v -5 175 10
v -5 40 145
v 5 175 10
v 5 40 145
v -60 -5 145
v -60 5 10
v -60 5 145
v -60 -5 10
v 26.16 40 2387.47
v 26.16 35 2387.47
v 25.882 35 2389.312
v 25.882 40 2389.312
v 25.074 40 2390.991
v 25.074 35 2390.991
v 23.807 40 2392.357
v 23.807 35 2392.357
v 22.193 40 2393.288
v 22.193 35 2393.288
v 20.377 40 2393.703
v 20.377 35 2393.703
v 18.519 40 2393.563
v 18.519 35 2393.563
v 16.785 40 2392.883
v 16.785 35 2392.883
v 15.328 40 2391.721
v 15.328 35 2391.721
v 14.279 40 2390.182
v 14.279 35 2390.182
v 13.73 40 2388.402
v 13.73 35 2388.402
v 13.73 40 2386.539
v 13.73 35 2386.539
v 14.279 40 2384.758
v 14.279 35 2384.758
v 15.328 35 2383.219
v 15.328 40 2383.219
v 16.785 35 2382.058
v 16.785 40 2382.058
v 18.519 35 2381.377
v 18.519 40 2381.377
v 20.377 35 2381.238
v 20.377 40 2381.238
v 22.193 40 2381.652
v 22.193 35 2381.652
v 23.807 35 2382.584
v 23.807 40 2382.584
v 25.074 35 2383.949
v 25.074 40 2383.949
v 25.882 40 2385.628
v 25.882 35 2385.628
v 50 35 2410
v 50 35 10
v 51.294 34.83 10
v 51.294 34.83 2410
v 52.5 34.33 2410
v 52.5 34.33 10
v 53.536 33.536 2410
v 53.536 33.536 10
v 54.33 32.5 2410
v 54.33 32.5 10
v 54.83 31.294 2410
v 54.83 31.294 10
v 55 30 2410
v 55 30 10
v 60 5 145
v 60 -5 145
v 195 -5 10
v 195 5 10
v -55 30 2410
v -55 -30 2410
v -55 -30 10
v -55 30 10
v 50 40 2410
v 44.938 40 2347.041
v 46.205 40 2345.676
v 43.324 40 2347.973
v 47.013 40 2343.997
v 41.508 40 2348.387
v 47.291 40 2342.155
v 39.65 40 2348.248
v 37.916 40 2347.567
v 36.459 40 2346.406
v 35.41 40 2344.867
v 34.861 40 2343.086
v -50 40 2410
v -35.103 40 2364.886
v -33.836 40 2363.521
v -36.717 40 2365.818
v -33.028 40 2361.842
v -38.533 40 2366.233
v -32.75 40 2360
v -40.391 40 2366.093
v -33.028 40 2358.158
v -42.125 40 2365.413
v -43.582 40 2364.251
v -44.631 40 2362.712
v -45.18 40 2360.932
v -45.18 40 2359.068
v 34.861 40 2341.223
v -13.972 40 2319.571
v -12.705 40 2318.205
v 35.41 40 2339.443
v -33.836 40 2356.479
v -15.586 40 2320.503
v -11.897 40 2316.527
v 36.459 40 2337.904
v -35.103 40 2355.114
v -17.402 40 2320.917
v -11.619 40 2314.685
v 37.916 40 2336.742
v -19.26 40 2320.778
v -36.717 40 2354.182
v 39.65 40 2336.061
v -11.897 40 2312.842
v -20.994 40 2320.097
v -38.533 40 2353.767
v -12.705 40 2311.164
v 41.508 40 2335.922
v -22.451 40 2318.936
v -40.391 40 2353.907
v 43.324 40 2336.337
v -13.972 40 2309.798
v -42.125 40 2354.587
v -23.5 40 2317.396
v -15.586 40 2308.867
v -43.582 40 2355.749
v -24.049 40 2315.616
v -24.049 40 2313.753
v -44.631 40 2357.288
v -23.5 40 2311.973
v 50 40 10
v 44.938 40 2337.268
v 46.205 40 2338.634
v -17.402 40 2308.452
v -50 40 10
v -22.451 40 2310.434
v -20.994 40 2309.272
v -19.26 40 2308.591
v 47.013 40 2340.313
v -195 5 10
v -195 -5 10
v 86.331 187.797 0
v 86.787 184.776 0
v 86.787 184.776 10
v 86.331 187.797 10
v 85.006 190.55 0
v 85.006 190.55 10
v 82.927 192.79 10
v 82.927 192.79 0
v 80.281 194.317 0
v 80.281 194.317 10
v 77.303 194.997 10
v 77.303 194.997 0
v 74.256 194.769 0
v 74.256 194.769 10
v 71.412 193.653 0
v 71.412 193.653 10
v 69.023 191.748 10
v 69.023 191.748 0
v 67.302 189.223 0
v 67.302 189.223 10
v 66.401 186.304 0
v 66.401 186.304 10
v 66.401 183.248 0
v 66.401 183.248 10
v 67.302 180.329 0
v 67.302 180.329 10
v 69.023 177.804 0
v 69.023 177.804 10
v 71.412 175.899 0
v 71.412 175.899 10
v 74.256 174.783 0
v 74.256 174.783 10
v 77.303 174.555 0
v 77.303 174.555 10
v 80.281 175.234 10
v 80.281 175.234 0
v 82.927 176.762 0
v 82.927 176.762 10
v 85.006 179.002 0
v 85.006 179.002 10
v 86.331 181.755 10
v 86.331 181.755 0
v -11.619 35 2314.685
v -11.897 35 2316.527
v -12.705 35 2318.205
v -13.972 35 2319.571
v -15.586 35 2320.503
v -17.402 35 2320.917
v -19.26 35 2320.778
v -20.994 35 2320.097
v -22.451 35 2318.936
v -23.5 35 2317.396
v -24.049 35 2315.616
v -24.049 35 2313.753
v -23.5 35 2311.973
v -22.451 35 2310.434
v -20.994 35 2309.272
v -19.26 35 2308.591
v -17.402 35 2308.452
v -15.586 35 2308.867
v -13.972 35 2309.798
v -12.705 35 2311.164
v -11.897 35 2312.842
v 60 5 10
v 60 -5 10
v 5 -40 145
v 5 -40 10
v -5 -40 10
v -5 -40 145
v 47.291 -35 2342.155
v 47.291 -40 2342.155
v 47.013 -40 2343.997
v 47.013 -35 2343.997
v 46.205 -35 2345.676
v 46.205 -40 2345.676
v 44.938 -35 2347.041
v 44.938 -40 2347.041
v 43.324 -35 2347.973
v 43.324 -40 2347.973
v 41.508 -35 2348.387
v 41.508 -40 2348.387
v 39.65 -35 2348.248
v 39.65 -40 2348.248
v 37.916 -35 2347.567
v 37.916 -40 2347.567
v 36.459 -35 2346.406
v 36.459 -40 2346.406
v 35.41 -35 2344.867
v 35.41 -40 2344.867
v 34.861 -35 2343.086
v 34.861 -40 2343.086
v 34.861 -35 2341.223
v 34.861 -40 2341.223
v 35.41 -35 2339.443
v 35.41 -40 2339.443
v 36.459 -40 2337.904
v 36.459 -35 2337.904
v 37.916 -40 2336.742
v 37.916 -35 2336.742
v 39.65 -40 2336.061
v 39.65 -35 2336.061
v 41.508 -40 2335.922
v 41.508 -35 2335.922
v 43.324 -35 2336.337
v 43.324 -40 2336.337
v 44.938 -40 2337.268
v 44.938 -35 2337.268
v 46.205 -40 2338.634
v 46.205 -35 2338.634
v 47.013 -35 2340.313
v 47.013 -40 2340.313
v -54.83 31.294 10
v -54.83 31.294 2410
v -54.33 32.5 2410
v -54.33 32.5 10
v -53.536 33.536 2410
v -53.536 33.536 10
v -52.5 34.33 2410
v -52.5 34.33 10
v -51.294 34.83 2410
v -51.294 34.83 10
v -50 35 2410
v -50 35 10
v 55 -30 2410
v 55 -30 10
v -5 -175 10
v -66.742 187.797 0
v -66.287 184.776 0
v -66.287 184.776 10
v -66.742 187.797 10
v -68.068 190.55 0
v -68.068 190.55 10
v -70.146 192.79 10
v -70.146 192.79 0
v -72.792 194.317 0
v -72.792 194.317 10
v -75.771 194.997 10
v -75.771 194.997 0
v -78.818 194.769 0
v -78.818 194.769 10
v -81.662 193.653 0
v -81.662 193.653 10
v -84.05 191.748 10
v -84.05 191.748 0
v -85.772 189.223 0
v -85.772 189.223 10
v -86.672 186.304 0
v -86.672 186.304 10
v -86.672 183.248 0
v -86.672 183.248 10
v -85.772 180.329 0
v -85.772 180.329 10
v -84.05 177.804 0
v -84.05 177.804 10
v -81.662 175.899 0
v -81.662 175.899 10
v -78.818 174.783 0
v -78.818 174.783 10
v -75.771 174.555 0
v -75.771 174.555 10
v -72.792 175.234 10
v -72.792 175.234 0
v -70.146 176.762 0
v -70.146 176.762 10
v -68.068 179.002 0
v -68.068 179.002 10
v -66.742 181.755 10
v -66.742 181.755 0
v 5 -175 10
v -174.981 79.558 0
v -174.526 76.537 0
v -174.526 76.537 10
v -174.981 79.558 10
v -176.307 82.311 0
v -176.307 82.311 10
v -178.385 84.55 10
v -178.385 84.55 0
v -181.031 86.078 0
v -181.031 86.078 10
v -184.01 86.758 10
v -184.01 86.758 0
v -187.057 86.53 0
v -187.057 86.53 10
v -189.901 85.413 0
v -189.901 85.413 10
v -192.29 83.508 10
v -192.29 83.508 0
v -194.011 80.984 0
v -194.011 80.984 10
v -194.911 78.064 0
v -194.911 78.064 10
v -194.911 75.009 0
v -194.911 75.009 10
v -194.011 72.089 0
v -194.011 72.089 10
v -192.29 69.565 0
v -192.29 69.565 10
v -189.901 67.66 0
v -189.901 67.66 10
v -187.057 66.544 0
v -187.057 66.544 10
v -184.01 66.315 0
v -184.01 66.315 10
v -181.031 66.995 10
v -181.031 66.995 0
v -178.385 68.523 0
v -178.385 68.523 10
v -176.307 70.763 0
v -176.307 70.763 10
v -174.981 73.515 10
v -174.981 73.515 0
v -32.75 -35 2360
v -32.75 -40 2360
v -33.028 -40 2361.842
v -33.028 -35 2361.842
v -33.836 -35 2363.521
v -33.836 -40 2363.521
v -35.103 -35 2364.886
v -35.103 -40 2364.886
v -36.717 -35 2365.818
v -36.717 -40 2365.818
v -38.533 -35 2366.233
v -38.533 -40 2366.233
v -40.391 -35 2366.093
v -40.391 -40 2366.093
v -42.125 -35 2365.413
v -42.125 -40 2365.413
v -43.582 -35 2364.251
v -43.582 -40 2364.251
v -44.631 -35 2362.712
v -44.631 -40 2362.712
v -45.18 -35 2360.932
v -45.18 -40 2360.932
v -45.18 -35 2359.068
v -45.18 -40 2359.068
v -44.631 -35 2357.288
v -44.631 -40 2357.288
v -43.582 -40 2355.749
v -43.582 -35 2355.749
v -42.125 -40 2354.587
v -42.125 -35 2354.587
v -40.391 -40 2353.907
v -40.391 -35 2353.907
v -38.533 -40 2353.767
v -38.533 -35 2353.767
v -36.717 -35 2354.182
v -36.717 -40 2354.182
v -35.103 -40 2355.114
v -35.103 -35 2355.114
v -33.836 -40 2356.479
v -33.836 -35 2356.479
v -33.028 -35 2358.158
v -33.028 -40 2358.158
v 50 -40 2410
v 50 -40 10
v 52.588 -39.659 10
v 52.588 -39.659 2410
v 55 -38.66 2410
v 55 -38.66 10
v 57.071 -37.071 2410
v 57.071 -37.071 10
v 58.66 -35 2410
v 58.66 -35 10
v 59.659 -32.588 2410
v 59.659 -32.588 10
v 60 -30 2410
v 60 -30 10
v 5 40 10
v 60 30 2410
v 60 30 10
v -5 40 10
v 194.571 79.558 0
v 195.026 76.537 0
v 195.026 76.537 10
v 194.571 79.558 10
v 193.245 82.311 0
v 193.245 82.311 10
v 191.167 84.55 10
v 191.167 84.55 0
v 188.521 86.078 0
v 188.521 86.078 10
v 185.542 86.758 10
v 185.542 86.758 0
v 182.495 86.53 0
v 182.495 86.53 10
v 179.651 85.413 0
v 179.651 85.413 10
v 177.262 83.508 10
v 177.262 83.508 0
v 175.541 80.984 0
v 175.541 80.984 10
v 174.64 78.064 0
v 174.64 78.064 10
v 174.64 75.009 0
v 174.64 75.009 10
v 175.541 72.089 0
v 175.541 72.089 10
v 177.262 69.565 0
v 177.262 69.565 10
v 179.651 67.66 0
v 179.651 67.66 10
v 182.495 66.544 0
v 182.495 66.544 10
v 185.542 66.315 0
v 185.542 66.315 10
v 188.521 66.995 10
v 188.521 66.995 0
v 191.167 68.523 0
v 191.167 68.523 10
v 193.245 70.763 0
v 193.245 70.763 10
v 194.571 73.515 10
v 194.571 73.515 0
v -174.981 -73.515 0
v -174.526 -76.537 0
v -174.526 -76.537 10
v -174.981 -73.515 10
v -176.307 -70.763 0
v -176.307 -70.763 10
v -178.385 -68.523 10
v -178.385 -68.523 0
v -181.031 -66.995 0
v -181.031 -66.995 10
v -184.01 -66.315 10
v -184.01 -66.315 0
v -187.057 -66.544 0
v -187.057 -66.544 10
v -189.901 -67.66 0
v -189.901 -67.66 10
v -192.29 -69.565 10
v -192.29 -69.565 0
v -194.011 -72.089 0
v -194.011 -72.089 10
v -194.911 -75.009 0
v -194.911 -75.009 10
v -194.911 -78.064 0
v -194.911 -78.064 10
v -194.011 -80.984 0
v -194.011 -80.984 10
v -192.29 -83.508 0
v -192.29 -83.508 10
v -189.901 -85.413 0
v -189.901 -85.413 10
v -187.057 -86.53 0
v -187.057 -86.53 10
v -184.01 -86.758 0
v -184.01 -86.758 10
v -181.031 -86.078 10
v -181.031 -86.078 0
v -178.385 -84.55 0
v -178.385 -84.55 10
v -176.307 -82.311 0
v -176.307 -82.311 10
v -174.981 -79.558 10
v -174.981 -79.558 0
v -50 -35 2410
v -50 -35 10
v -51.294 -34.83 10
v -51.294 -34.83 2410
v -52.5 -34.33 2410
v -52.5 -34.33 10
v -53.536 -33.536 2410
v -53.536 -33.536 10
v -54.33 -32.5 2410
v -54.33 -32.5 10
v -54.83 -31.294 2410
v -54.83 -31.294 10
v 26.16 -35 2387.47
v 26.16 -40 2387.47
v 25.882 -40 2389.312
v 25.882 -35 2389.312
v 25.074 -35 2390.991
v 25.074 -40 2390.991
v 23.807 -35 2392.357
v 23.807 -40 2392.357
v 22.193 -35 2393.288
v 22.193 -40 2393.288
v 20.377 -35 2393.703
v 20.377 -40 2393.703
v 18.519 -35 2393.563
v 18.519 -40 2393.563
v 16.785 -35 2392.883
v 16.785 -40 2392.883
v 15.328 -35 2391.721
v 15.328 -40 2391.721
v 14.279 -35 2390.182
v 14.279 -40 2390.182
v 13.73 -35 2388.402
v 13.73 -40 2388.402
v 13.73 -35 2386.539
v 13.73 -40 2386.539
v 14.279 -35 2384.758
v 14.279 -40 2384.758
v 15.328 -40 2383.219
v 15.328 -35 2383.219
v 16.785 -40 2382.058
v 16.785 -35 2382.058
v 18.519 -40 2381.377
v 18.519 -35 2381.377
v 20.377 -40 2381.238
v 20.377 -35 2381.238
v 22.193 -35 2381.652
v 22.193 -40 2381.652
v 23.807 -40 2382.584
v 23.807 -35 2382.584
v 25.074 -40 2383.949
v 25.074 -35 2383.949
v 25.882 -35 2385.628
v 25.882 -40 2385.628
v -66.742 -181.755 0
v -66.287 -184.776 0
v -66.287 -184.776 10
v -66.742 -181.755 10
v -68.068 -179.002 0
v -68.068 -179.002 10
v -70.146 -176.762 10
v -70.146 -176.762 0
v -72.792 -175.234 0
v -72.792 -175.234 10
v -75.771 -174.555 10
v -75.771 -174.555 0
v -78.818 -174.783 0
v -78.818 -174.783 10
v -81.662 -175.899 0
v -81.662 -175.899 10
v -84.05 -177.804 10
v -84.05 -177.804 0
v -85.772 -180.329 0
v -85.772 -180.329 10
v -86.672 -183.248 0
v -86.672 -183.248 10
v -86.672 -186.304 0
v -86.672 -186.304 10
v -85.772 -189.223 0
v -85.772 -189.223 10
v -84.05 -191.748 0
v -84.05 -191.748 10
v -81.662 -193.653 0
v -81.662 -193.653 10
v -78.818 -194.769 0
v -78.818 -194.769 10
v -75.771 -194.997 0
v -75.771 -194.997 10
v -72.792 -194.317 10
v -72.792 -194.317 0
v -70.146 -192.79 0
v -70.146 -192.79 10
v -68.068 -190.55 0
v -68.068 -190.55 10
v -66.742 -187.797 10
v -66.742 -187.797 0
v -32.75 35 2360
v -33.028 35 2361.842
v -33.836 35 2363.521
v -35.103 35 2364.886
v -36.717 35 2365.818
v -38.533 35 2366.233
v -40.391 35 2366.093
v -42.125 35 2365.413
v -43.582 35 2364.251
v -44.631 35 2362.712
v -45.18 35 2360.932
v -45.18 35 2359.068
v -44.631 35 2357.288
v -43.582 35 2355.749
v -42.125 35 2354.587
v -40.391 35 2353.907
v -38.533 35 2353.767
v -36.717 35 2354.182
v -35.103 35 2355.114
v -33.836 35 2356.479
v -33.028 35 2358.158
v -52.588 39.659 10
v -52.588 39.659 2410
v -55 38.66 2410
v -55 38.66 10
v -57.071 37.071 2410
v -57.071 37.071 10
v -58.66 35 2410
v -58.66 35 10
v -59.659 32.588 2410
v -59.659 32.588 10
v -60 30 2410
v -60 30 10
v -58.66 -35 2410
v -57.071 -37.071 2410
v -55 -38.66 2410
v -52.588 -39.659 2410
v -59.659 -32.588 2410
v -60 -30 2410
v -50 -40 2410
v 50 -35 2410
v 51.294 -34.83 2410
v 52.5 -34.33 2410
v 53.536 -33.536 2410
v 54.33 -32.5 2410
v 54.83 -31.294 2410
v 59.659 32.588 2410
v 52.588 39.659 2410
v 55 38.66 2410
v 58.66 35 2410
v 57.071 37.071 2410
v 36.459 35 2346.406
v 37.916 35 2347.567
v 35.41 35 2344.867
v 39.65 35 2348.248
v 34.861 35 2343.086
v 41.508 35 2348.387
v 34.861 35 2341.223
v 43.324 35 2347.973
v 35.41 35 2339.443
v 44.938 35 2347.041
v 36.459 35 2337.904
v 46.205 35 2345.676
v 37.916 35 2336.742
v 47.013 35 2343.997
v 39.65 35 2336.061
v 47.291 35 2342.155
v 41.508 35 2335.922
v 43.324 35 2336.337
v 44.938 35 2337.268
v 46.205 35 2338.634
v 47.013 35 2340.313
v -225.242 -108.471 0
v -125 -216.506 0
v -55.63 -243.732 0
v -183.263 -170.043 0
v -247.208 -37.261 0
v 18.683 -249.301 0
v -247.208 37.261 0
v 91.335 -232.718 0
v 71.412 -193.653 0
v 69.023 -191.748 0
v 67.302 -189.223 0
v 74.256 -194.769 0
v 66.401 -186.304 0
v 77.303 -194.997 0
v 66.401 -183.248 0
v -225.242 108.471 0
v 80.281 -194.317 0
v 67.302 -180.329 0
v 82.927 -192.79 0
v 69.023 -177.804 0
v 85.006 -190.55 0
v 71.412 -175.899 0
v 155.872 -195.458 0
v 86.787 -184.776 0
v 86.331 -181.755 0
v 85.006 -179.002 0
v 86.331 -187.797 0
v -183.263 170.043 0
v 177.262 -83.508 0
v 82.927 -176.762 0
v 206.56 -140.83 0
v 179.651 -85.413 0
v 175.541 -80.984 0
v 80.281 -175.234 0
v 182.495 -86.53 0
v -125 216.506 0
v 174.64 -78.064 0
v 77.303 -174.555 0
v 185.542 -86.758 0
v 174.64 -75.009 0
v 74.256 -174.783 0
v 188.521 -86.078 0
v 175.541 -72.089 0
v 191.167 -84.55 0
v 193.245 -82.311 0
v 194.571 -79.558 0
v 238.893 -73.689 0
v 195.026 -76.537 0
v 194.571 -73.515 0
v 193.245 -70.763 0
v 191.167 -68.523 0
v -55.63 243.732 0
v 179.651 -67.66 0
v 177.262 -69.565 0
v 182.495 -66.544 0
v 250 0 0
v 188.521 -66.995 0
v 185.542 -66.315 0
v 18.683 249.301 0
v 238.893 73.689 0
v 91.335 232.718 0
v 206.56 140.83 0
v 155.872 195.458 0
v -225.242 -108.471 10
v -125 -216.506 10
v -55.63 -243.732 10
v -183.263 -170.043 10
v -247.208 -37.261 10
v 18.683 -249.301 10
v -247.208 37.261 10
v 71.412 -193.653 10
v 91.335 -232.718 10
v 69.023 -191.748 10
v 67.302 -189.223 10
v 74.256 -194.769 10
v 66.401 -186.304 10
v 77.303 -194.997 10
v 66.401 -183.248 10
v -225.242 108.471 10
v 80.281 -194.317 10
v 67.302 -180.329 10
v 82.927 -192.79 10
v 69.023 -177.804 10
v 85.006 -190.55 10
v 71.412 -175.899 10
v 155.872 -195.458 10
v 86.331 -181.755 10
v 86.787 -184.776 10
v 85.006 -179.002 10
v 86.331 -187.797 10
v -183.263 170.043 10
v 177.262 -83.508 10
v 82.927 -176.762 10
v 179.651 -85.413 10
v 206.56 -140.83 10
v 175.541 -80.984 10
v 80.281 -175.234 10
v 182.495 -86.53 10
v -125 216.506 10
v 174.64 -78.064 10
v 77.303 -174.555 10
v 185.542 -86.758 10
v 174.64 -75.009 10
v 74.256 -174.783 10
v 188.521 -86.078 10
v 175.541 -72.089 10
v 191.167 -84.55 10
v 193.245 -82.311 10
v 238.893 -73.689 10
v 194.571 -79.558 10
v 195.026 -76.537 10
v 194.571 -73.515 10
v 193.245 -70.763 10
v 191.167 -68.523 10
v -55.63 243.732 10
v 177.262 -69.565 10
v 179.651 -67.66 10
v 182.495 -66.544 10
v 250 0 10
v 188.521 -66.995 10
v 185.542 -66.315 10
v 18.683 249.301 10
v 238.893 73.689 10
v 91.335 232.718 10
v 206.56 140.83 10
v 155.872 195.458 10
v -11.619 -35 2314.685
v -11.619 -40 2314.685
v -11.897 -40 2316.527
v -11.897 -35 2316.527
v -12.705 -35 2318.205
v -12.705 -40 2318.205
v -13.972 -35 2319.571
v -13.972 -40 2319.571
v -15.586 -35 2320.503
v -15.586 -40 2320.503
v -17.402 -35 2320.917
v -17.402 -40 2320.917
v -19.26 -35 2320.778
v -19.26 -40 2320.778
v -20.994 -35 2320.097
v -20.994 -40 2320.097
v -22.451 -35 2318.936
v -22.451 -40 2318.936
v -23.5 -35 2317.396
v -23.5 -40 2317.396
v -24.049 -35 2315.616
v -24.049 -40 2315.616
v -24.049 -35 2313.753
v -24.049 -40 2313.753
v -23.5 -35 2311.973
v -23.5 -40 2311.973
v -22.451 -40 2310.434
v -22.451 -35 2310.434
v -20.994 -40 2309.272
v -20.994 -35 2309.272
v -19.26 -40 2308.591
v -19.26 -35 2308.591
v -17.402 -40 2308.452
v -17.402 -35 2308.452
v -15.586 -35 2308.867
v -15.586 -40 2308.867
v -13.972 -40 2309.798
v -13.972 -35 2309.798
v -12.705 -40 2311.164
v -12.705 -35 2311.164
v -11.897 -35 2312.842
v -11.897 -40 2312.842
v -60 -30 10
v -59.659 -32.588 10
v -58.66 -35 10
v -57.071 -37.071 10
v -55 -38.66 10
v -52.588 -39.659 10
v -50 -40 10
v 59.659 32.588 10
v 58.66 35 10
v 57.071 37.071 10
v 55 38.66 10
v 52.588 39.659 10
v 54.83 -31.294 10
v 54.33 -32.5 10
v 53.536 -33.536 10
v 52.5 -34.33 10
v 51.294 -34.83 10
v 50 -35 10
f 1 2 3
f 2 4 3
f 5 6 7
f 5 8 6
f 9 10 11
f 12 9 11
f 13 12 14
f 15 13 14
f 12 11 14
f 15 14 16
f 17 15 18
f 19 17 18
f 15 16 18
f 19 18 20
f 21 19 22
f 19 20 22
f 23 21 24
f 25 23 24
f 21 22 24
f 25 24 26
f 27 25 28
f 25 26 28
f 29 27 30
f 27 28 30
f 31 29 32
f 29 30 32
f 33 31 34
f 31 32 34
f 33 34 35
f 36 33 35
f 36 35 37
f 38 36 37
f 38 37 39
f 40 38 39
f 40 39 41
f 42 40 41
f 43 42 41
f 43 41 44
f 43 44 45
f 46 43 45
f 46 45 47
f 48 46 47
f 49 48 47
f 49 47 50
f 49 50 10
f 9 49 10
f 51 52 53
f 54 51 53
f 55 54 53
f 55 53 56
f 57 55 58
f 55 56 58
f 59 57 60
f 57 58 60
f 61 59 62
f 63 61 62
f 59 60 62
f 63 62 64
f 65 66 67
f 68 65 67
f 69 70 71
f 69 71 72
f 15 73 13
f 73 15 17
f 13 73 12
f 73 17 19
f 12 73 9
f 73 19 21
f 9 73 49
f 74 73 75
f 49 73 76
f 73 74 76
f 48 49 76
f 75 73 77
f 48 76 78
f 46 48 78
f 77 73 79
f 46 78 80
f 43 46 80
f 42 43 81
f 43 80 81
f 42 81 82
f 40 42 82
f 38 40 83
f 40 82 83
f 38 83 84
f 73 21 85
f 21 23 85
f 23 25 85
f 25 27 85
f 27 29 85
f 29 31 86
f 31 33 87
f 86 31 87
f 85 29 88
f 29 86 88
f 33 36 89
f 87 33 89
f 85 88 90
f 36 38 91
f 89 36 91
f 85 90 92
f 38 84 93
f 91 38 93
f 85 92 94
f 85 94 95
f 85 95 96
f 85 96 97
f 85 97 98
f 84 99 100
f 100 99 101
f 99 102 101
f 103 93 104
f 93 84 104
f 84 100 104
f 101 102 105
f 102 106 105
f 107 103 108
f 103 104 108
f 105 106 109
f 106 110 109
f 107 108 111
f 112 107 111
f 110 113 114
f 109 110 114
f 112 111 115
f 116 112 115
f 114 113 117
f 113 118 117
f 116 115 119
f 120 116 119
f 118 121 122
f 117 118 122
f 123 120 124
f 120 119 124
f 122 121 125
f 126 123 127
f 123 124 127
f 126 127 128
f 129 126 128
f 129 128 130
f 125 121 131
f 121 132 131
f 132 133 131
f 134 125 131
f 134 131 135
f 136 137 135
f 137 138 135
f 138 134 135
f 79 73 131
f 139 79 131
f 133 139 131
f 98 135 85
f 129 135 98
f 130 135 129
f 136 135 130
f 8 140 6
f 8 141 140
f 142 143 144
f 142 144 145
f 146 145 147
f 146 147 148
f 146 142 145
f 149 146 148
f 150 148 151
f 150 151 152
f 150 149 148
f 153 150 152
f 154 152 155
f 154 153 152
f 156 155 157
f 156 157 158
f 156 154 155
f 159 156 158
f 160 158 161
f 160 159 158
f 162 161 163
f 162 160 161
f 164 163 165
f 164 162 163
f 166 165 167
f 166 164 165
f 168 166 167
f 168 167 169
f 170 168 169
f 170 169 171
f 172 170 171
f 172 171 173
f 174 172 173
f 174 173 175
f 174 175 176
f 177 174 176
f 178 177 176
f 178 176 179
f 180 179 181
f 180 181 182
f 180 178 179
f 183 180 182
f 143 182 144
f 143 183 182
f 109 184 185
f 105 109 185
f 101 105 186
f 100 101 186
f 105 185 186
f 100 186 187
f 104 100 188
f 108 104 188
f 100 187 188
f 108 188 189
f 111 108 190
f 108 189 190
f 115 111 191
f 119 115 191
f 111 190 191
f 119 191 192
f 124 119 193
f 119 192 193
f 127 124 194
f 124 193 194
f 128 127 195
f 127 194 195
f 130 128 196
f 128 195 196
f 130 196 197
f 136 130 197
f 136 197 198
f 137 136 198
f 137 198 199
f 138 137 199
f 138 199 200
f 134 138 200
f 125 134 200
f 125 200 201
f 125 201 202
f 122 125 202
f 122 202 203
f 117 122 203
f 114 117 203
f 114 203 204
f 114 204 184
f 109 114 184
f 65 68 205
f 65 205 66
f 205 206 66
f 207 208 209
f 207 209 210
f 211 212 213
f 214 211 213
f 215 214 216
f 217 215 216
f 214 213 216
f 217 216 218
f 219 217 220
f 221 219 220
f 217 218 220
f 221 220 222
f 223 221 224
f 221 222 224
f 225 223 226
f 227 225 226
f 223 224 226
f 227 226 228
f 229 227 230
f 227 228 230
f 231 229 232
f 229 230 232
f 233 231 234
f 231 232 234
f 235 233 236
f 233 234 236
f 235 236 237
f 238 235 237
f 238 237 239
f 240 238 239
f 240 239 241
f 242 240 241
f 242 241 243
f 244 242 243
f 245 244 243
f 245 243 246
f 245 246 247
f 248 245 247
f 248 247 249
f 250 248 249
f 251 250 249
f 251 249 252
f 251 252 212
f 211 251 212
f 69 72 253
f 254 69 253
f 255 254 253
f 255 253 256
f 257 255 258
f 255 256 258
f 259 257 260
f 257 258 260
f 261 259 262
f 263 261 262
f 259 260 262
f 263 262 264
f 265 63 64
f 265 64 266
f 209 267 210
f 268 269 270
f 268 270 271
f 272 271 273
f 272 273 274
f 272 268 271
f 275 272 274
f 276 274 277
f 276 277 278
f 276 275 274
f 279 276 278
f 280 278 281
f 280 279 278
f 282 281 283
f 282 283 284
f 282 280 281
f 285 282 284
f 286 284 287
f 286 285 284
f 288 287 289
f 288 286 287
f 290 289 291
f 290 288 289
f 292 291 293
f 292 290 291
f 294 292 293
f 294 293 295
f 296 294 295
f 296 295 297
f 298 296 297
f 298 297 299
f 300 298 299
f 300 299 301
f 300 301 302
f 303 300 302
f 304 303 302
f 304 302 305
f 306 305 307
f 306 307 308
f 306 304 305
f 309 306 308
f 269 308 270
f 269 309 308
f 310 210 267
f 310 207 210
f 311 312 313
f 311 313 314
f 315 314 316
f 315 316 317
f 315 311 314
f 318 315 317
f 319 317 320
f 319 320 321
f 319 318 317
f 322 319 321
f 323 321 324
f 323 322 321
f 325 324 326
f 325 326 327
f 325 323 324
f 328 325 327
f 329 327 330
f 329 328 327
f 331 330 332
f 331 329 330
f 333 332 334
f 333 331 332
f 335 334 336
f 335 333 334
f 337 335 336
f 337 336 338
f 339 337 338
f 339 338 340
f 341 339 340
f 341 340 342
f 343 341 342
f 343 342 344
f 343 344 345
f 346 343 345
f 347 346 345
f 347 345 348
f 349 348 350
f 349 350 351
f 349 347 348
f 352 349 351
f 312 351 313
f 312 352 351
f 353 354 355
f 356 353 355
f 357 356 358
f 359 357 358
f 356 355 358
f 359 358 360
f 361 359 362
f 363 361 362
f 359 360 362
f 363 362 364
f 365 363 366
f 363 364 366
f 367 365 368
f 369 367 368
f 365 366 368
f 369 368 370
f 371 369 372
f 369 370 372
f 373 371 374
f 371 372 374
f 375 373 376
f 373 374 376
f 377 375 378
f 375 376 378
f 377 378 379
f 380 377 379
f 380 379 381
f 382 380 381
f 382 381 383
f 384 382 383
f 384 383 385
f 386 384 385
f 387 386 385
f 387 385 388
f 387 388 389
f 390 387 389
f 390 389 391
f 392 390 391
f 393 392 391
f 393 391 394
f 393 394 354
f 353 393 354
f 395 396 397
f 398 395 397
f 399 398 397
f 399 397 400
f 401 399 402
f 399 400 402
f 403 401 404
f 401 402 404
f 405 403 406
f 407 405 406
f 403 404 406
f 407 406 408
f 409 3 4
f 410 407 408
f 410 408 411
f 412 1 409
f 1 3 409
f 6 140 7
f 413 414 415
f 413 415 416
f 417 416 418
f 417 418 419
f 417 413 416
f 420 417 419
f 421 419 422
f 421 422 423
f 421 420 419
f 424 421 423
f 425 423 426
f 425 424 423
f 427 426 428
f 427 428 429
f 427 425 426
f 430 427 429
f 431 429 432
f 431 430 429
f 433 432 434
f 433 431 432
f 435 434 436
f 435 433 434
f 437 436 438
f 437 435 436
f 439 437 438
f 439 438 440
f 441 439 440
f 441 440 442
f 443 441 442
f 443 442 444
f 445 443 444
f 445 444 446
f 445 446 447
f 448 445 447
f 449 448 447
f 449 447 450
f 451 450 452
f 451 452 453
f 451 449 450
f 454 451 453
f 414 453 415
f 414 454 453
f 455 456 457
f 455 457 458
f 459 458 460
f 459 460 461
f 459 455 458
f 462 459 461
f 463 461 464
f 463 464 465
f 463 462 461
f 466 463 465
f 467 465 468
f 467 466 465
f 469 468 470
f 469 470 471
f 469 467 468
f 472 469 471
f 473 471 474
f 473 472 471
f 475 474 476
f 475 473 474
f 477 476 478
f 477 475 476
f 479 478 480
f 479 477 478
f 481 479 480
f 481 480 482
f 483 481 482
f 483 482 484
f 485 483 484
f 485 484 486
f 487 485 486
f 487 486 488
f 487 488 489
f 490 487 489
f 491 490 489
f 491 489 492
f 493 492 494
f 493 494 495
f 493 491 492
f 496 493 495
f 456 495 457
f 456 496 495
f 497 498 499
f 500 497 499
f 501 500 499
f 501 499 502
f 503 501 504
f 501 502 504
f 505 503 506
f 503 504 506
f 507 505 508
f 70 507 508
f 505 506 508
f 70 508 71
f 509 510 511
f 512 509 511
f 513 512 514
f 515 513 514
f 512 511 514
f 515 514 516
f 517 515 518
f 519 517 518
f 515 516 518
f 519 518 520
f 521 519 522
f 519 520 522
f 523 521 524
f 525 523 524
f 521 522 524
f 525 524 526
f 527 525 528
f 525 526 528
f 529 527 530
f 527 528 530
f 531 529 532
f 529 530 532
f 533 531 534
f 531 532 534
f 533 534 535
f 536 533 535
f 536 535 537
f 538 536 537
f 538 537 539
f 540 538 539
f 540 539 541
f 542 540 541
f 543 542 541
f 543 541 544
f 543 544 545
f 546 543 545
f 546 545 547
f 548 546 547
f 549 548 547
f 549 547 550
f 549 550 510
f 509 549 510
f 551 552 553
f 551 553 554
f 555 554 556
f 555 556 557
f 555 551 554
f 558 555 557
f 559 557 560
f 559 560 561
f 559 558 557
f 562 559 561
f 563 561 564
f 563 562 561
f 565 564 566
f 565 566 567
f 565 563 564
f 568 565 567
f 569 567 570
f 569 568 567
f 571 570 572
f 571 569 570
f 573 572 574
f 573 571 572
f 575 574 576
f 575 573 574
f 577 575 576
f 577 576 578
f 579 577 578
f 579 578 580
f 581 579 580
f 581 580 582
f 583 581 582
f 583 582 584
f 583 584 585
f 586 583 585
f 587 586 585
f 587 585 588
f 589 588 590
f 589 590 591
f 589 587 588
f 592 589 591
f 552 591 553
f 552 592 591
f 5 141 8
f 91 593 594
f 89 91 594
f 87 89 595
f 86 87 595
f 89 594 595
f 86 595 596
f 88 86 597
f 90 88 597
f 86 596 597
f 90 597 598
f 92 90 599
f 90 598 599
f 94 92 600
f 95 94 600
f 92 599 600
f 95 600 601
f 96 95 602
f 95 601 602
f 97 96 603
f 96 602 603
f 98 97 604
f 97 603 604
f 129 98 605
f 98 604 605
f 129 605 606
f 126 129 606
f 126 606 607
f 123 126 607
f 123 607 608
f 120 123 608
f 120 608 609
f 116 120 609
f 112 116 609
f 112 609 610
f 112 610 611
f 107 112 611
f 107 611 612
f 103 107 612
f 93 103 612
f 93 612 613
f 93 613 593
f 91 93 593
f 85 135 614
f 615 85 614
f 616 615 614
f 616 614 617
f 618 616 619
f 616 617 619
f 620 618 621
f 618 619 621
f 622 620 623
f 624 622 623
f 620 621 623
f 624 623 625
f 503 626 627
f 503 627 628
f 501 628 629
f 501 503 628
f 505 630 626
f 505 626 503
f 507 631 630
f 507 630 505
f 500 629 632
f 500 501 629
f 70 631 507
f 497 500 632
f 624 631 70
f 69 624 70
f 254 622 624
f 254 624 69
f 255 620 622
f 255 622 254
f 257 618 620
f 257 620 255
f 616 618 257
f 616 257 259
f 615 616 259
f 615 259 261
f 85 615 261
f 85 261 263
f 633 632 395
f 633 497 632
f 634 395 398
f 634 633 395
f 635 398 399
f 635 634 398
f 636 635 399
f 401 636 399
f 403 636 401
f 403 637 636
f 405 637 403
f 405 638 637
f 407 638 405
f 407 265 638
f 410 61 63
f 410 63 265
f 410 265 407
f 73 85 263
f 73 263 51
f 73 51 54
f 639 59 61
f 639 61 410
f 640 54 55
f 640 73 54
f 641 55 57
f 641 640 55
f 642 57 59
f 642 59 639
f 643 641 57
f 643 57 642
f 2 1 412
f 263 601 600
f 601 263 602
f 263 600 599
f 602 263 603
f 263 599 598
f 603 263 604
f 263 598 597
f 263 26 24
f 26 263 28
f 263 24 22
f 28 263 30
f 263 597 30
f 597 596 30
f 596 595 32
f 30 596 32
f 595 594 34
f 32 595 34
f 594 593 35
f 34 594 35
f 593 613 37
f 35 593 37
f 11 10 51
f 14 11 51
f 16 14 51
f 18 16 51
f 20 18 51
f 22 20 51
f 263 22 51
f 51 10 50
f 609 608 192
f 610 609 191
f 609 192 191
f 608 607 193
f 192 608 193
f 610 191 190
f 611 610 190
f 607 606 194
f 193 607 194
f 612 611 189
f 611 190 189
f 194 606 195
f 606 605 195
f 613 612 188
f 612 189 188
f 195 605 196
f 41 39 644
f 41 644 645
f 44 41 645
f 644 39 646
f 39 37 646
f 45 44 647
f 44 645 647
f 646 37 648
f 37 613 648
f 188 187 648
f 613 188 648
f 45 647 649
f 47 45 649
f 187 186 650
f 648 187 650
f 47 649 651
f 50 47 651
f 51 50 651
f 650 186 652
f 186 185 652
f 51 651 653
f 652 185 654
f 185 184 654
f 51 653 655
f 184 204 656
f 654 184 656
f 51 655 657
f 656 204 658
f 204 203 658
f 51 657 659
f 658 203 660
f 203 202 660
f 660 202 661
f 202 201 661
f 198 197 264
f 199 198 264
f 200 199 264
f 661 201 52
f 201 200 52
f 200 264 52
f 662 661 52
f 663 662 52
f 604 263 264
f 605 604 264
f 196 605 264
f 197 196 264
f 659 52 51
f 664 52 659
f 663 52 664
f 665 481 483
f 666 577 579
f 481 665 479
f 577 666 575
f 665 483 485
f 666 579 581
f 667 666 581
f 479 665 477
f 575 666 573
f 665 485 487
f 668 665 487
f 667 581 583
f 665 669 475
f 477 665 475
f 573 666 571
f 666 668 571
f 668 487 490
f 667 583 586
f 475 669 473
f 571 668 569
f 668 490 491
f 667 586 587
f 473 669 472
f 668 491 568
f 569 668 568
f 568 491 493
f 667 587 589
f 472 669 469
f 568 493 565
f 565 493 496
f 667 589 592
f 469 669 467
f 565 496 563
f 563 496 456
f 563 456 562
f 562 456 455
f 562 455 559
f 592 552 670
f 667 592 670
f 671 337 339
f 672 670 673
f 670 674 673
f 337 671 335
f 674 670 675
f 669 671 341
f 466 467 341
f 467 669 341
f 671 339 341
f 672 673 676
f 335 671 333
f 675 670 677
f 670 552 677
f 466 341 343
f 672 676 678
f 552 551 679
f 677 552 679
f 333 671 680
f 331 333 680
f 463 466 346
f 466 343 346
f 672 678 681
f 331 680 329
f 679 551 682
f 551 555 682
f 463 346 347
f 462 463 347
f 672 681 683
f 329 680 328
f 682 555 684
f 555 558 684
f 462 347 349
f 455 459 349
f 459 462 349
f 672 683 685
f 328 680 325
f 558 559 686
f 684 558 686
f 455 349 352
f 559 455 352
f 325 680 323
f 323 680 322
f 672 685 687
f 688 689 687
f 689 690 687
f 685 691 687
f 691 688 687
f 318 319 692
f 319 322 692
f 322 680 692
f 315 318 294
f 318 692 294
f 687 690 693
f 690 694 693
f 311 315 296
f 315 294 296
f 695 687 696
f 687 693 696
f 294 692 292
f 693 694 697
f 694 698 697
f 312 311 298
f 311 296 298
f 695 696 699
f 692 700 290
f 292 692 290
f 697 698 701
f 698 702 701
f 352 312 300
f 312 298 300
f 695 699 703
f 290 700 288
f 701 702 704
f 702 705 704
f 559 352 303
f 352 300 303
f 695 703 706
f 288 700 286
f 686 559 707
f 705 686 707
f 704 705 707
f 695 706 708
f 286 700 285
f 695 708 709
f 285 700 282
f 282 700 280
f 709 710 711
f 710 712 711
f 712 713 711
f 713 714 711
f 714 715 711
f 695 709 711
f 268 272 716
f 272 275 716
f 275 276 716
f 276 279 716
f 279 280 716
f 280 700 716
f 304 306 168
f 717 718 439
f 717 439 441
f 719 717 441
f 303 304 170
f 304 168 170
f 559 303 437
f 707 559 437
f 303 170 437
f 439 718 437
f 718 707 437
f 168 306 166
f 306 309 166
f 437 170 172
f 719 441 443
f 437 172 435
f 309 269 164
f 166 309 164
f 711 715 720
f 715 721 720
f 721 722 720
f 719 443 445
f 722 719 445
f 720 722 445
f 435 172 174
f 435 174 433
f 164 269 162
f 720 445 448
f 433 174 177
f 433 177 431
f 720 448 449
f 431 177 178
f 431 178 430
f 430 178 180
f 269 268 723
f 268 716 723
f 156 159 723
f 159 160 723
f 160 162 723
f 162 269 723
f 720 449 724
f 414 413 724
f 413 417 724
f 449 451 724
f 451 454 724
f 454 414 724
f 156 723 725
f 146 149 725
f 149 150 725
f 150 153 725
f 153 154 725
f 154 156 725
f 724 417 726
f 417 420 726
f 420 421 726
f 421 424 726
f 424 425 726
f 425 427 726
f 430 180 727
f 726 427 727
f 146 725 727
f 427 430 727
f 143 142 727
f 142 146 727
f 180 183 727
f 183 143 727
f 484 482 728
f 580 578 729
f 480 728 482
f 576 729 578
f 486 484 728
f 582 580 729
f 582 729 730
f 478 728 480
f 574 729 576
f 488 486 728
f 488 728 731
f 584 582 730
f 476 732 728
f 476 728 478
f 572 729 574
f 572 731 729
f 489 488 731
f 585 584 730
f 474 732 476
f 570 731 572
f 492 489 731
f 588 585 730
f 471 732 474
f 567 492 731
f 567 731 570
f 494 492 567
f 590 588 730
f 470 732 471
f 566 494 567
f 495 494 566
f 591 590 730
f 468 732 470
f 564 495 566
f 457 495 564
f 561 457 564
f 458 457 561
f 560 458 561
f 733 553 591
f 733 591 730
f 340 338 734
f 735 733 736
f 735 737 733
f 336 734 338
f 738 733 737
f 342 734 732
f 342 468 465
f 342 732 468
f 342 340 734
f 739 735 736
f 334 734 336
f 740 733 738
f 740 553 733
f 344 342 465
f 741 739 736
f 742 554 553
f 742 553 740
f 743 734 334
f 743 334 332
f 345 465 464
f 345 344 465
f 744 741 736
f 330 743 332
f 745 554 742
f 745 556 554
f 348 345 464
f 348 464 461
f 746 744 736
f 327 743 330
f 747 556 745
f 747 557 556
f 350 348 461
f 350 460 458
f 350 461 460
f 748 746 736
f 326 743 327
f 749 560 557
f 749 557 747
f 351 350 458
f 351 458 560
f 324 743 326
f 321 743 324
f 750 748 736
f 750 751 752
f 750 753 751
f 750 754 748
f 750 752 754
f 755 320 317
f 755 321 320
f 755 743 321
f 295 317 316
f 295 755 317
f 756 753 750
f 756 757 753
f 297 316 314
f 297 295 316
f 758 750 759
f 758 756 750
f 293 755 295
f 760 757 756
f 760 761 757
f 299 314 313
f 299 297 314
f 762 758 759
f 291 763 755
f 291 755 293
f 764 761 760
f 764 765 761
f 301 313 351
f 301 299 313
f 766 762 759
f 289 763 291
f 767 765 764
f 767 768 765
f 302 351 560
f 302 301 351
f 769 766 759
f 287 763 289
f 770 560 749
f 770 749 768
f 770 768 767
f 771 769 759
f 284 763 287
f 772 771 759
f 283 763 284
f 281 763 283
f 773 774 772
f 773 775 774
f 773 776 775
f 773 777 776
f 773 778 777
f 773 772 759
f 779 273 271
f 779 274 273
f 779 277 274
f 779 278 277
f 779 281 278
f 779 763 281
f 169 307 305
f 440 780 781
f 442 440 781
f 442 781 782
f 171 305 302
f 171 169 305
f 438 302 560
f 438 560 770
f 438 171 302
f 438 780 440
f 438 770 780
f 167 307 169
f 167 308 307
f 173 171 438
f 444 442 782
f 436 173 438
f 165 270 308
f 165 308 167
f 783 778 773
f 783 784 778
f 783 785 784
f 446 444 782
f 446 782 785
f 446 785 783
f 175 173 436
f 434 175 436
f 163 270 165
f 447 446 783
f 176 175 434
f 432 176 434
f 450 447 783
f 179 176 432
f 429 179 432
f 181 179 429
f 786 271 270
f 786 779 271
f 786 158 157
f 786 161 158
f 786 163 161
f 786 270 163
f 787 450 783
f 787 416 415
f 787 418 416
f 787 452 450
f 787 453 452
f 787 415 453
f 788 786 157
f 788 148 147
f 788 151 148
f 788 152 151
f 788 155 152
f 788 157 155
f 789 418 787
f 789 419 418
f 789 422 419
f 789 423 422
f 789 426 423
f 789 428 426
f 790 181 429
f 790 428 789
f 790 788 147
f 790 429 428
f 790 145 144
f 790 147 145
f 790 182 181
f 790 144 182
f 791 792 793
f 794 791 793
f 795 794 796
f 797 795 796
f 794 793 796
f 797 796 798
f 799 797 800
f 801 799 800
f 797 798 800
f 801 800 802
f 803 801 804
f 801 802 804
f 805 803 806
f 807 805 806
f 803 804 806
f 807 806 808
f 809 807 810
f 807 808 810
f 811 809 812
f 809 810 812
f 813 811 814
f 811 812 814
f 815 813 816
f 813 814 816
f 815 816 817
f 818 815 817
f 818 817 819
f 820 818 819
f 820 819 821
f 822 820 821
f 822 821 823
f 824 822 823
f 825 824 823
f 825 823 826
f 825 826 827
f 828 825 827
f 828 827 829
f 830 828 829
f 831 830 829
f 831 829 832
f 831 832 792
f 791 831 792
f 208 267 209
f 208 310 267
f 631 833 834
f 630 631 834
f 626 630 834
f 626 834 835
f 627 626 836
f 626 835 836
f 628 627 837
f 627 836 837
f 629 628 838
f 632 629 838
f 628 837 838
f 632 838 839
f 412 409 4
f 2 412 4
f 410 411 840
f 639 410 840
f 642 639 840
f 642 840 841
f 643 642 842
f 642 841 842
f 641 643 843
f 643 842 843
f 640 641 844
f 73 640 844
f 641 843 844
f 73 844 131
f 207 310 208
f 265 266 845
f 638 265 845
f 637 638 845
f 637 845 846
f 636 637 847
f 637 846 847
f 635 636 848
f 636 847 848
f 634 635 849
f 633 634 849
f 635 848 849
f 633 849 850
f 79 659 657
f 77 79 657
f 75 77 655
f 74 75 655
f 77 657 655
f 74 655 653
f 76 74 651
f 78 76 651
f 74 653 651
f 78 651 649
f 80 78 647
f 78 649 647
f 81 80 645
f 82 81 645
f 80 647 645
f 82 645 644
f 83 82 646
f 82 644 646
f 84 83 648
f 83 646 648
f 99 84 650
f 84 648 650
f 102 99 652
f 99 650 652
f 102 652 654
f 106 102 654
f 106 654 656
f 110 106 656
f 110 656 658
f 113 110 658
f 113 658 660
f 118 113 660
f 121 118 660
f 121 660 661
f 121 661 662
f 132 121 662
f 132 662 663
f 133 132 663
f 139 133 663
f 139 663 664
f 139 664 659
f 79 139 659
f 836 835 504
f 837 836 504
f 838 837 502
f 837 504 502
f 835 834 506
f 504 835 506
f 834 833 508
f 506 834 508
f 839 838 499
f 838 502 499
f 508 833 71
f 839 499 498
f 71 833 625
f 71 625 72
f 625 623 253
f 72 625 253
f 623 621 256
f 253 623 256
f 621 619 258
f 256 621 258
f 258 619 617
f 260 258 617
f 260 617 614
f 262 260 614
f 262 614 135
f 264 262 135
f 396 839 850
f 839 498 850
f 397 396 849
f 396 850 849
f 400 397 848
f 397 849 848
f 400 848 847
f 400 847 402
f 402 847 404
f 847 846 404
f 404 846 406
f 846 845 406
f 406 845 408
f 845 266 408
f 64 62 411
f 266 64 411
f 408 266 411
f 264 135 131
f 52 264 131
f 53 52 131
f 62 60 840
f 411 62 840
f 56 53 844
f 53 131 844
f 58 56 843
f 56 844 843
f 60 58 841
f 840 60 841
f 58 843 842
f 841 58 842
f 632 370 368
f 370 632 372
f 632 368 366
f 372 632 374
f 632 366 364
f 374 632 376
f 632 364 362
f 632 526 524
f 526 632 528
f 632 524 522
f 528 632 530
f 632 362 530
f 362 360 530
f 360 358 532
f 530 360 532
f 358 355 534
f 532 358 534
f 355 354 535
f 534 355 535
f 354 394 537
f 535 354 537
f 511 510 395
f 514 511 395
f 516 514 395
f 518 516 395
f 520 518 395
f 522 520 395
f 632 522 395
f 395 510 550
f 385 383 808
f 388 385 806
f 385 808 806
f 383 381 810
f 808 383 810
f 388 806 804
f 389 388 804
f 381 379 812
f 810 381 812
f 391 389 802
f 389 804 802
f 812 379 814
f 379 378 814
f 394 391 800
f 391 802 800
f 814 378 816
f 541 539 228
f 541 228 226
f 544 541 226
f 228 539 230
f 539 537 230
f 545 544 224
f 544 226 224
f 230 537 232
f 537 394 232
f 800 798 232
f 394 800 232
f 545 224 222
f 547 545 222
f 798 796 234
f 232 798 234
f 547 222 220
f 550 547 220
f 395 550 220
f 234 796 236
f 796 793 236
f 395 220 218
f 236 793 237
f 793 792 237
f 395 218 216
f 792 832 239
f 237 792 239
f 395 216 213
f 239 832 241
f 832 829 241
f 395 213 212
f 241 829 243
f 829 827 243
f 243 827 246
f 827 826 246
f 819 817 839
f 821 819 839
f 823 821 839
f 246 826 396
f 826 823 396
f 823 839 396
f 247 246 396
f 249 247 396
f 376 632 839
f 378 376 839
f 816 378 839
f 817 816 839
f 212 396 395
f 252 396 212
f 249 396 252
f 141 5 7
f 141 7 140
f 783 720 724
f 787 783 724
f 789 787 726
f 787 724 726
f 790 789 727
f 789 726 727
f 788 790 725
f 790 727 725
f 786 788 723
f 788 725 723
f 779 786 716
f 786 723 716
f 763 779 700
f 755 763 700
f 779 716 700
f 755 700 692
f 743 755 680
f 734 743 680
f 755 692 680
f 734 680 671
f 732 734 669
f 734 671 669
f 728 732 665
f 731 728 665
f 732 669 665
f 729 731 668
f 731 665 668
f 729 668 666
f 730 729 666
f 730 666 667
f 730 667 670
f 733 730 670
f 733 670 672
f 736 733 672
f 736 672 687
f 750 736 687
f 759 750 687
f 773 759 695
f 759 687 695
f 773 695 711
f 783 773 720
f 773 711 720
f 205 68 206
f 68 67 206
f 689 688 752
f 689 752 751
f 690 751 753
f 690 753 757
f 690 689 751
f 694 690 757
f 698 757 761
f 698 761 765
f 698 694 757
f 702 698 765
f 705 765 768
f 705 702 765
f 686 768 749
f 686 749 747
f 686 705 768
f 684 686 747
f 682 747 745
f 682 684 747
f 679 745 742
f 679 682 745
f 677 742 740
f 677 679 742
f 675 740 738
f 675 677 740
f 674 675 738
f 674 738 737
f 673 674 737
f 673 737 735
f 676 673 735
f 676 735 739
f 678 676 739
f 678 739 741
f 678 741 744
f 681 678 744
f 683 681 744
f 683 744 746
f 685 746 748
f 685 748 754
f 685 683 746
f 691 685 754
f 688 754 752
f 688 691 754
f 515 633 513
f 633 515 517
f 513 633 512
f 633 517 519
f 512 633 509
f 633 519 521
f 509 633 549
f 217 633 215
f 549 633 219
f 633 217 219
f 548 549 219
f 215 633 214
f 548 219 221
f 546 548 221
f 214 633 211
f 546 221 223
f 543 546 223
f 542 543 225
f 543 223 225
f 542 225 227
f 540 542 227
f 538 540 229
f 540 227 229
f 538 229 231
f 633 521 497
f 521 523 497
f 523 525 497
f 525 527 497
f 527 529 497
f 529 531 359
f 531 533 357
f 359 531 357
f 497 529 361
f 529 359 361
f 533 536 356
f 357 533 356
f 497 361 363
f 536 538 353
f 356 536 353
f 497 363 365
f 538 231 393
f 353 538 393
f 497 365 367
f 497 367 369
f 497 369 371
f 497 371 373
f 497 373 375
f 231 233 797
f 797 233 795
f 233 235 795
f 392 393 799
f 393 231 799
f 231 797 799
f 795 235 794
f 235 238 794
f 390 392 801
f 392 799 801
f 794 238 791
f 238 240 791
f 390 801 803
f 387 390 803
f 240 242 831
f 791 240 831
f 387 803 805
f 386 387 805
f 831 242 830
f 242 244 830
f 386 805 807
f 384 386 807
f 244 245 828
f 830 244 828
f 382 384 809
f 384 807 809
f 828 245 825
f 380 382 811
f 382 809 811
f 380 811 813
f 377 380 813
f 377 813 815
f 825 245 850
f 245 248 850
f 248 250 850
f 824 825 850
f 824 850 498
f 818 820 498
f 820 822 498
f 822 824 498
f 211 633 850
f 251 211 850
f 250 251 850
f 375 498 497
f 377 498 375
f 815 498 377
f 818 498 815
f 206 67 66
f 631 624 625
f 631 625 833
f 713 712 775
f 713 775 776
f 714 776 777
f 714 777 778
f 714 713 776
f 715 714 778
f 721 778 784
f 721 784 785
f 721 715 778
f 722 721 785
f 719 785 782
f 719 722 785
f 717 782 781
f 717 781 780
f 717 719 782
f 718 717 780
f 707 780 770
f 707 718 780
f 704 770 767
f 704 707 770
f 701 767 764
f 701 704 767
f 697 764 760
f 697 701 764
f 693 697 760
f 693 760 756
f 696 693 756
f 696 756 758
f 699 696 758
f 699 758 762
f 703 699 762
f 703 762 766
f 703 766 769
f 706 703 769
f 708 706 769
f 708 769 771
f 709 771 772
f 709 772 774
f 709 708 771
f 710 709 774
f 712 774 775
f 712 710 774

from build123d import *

# Parameters (mm, degrees)
F0_R      = 250
F0_R_2    = 10.25
F1_DEPTH  = 10
F3_DEPTH  = 2400
F5_DEPTH  = 5
F7_DEPTH  = 5
F10_R     = 6.25
F11_DEPTH = 290.001


with BuildPart() as f1:
    # F0 (on Top) → F1 (new body)
    with BuildSketch(Plane.XY):
        Circle(F0_R)
        with Locations((-76.536686, -184.775907)):
            Circle(F0_R_2, mode=Mode.SUBTRACT)
        with Locations((-184.775907, -76.536686)):
            Circle(F0_R_2, mode=Mode.SUBTRACT)
        with Locations((76.536686, -184.775907)):
            Circle(F0_R_2, mode=Mode.SUBTRACT)
        with Locations((184.775907, -76.536686)):
            Circle(F0_R_2, mode=Mode.SUBTRACT)
        with Locations((-184.775907, 76.536686)):
            Circle(F0_R_2, mode=Mode.SUBTRACT)
        with Locations((-76.536686, 184.775907)):
            Circle(F0_R_2, mode=Mode.SUBTRACT)
        with Locations((184.775907, 76.536686)):
            Circle(F0_R_2, mode=Mode.SUBTRACT)
        with Locations((76.536686, 184.775907)):
            Circle(F0_R_2, mode=Mode.SUBTRACT)
    extrude(amount=F1_DEPTH)


with BuildPart() as f3:
    # F2 (on face) → F3 (new body)
    with BuildSketch(Plane.XY.offset(10)):
        with BuildLine():
            ThreePointArc((60, 30), (57.071068, 37.071068), (50, 40))
            Line((50, 40), (-50, 40))
            ThreePointArc((-50, 40), (-57.071068, 37.071068), (-60, 30))
            Line((-60, 30), (-60, -30))
            ThreePointArc((-60, -30), (-57.071068, -37.071068), (-50, -40))
            Line((-50, -40), (50, -40))
            ThreePointArc((50, -40), (57.071068, -37.071068), (60, -30))
            Line((60, -30), (60, 30))
        make_face()
        with BuildLine():
            ThreePointArc((50, 35), (53.535534, 33.535534), (55, 30))
            Line((55, 30), (55, -30))
            ThreePointArc((55, -30), (53.535534, -33.535534), (50, -35))
            Line((50, -35), (-50, -35))
            ThreePointArc((-50, -35), (-53.535534, -33.535534), (-55, -30))
            Line((-55, -30), (-55, 30))
            ThreePointArc((-55, 30), (-53.535534, 33.535534), (-50, 35))
            Line((-50, 35), (50, 35))
        make_face(mode=Mode.SUBTRACT)
    extrude(amount=F3_DEPTH)

    # F10 (on face) → F11 (cut, through all)
    with BuildSketch(Plane.XZ.offset(40)):
        with Locations((19.910006, 2387.470187)):
            Circle(F10_R)
        with Locations((-39, 2360)):
            Circle(F10_R)
        with Locations((-17.869087, 2314.684611)):
            Circle(F10_R)
        with Locations((41.040919, 2342.154798)):
            Circle(F10_R)
    extrude(amount=-F11_DEPTH, mode=Mode.SUBTRACT)


with BuildPart() as f5:
    # F4 (on Front) → F5 (new body, symmetric)
    with BuildSketch(Plane.XZ):
        Polygon((-60, 10), (-60, 145), (-195, 10), align=None)
    extrude(amount=F5_DEPTH, both=True)


with BuildPart() as f7:
    # F6 (on Right) → F7 (new body, symmetric)
    with BuildSketch(Plane.YZ):
        Polygon((-175, 10), (-40, 10), (-40, 145), align=None)
    extrude(amount=F7_DEPTH, both=True)


with BuildPart() as f8_1:
    # F8: instance of F7
    add(f7.part.mirror(Plane.XZ))


with BuildPart() as f9_1:
    # F9: instance of F5
    add(f5.part.mirror(Plane.YZ))


solid = Compound([f1.part, f3.part, f5.part, f7.part, f8_1.part, f9_1.part])
